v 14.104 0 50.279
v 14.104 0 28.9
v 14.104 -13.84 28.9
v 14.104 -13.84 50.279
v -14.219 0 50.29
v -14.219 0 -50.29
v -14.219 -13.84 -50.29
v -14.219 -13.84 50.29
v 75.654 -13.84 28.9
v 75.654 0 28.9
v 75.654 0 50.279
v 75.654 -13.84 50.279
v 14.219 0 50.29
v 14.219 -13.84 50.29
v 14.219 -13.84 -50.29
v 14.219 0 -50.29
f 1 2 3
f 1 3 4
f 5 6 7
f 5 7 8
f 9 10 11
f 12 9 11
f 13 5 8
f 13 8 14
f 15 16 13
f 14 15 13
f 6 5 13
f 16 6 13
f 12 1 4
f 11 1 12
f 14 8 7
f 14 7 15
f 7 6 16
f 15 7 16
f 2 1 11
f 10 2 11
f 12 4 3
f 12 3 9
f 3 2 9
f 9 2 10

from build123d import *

# Parameters (mm, degrees)
F1_W     = 61.5491271019
F1_H     = 21.3788896799
F2_DEPTH = 13.8399954885
F0_W     = 28.4387171268
F0_H     = 100.5795300007


with BuildPart() as f2:
    # F1 (on Front) → F2 (new body)
    with BuildSketch(Plane.XZ):
        with Locations((44.8790490627, 39.5893901587)):
            Rectangle(F1_W, F1_H)
    extrude(amount=F2_DEPTH)


with BuildPart() as f2b:
    # F0 (on Front) → F2, piece 2 (new body)
    with BuildSketch(Plane.XZ):
        Rectangle(F0_W, F0_H)
    extrude(amount=F2_DEPTH)


solid = Compound([f2.part, f2b.part])
